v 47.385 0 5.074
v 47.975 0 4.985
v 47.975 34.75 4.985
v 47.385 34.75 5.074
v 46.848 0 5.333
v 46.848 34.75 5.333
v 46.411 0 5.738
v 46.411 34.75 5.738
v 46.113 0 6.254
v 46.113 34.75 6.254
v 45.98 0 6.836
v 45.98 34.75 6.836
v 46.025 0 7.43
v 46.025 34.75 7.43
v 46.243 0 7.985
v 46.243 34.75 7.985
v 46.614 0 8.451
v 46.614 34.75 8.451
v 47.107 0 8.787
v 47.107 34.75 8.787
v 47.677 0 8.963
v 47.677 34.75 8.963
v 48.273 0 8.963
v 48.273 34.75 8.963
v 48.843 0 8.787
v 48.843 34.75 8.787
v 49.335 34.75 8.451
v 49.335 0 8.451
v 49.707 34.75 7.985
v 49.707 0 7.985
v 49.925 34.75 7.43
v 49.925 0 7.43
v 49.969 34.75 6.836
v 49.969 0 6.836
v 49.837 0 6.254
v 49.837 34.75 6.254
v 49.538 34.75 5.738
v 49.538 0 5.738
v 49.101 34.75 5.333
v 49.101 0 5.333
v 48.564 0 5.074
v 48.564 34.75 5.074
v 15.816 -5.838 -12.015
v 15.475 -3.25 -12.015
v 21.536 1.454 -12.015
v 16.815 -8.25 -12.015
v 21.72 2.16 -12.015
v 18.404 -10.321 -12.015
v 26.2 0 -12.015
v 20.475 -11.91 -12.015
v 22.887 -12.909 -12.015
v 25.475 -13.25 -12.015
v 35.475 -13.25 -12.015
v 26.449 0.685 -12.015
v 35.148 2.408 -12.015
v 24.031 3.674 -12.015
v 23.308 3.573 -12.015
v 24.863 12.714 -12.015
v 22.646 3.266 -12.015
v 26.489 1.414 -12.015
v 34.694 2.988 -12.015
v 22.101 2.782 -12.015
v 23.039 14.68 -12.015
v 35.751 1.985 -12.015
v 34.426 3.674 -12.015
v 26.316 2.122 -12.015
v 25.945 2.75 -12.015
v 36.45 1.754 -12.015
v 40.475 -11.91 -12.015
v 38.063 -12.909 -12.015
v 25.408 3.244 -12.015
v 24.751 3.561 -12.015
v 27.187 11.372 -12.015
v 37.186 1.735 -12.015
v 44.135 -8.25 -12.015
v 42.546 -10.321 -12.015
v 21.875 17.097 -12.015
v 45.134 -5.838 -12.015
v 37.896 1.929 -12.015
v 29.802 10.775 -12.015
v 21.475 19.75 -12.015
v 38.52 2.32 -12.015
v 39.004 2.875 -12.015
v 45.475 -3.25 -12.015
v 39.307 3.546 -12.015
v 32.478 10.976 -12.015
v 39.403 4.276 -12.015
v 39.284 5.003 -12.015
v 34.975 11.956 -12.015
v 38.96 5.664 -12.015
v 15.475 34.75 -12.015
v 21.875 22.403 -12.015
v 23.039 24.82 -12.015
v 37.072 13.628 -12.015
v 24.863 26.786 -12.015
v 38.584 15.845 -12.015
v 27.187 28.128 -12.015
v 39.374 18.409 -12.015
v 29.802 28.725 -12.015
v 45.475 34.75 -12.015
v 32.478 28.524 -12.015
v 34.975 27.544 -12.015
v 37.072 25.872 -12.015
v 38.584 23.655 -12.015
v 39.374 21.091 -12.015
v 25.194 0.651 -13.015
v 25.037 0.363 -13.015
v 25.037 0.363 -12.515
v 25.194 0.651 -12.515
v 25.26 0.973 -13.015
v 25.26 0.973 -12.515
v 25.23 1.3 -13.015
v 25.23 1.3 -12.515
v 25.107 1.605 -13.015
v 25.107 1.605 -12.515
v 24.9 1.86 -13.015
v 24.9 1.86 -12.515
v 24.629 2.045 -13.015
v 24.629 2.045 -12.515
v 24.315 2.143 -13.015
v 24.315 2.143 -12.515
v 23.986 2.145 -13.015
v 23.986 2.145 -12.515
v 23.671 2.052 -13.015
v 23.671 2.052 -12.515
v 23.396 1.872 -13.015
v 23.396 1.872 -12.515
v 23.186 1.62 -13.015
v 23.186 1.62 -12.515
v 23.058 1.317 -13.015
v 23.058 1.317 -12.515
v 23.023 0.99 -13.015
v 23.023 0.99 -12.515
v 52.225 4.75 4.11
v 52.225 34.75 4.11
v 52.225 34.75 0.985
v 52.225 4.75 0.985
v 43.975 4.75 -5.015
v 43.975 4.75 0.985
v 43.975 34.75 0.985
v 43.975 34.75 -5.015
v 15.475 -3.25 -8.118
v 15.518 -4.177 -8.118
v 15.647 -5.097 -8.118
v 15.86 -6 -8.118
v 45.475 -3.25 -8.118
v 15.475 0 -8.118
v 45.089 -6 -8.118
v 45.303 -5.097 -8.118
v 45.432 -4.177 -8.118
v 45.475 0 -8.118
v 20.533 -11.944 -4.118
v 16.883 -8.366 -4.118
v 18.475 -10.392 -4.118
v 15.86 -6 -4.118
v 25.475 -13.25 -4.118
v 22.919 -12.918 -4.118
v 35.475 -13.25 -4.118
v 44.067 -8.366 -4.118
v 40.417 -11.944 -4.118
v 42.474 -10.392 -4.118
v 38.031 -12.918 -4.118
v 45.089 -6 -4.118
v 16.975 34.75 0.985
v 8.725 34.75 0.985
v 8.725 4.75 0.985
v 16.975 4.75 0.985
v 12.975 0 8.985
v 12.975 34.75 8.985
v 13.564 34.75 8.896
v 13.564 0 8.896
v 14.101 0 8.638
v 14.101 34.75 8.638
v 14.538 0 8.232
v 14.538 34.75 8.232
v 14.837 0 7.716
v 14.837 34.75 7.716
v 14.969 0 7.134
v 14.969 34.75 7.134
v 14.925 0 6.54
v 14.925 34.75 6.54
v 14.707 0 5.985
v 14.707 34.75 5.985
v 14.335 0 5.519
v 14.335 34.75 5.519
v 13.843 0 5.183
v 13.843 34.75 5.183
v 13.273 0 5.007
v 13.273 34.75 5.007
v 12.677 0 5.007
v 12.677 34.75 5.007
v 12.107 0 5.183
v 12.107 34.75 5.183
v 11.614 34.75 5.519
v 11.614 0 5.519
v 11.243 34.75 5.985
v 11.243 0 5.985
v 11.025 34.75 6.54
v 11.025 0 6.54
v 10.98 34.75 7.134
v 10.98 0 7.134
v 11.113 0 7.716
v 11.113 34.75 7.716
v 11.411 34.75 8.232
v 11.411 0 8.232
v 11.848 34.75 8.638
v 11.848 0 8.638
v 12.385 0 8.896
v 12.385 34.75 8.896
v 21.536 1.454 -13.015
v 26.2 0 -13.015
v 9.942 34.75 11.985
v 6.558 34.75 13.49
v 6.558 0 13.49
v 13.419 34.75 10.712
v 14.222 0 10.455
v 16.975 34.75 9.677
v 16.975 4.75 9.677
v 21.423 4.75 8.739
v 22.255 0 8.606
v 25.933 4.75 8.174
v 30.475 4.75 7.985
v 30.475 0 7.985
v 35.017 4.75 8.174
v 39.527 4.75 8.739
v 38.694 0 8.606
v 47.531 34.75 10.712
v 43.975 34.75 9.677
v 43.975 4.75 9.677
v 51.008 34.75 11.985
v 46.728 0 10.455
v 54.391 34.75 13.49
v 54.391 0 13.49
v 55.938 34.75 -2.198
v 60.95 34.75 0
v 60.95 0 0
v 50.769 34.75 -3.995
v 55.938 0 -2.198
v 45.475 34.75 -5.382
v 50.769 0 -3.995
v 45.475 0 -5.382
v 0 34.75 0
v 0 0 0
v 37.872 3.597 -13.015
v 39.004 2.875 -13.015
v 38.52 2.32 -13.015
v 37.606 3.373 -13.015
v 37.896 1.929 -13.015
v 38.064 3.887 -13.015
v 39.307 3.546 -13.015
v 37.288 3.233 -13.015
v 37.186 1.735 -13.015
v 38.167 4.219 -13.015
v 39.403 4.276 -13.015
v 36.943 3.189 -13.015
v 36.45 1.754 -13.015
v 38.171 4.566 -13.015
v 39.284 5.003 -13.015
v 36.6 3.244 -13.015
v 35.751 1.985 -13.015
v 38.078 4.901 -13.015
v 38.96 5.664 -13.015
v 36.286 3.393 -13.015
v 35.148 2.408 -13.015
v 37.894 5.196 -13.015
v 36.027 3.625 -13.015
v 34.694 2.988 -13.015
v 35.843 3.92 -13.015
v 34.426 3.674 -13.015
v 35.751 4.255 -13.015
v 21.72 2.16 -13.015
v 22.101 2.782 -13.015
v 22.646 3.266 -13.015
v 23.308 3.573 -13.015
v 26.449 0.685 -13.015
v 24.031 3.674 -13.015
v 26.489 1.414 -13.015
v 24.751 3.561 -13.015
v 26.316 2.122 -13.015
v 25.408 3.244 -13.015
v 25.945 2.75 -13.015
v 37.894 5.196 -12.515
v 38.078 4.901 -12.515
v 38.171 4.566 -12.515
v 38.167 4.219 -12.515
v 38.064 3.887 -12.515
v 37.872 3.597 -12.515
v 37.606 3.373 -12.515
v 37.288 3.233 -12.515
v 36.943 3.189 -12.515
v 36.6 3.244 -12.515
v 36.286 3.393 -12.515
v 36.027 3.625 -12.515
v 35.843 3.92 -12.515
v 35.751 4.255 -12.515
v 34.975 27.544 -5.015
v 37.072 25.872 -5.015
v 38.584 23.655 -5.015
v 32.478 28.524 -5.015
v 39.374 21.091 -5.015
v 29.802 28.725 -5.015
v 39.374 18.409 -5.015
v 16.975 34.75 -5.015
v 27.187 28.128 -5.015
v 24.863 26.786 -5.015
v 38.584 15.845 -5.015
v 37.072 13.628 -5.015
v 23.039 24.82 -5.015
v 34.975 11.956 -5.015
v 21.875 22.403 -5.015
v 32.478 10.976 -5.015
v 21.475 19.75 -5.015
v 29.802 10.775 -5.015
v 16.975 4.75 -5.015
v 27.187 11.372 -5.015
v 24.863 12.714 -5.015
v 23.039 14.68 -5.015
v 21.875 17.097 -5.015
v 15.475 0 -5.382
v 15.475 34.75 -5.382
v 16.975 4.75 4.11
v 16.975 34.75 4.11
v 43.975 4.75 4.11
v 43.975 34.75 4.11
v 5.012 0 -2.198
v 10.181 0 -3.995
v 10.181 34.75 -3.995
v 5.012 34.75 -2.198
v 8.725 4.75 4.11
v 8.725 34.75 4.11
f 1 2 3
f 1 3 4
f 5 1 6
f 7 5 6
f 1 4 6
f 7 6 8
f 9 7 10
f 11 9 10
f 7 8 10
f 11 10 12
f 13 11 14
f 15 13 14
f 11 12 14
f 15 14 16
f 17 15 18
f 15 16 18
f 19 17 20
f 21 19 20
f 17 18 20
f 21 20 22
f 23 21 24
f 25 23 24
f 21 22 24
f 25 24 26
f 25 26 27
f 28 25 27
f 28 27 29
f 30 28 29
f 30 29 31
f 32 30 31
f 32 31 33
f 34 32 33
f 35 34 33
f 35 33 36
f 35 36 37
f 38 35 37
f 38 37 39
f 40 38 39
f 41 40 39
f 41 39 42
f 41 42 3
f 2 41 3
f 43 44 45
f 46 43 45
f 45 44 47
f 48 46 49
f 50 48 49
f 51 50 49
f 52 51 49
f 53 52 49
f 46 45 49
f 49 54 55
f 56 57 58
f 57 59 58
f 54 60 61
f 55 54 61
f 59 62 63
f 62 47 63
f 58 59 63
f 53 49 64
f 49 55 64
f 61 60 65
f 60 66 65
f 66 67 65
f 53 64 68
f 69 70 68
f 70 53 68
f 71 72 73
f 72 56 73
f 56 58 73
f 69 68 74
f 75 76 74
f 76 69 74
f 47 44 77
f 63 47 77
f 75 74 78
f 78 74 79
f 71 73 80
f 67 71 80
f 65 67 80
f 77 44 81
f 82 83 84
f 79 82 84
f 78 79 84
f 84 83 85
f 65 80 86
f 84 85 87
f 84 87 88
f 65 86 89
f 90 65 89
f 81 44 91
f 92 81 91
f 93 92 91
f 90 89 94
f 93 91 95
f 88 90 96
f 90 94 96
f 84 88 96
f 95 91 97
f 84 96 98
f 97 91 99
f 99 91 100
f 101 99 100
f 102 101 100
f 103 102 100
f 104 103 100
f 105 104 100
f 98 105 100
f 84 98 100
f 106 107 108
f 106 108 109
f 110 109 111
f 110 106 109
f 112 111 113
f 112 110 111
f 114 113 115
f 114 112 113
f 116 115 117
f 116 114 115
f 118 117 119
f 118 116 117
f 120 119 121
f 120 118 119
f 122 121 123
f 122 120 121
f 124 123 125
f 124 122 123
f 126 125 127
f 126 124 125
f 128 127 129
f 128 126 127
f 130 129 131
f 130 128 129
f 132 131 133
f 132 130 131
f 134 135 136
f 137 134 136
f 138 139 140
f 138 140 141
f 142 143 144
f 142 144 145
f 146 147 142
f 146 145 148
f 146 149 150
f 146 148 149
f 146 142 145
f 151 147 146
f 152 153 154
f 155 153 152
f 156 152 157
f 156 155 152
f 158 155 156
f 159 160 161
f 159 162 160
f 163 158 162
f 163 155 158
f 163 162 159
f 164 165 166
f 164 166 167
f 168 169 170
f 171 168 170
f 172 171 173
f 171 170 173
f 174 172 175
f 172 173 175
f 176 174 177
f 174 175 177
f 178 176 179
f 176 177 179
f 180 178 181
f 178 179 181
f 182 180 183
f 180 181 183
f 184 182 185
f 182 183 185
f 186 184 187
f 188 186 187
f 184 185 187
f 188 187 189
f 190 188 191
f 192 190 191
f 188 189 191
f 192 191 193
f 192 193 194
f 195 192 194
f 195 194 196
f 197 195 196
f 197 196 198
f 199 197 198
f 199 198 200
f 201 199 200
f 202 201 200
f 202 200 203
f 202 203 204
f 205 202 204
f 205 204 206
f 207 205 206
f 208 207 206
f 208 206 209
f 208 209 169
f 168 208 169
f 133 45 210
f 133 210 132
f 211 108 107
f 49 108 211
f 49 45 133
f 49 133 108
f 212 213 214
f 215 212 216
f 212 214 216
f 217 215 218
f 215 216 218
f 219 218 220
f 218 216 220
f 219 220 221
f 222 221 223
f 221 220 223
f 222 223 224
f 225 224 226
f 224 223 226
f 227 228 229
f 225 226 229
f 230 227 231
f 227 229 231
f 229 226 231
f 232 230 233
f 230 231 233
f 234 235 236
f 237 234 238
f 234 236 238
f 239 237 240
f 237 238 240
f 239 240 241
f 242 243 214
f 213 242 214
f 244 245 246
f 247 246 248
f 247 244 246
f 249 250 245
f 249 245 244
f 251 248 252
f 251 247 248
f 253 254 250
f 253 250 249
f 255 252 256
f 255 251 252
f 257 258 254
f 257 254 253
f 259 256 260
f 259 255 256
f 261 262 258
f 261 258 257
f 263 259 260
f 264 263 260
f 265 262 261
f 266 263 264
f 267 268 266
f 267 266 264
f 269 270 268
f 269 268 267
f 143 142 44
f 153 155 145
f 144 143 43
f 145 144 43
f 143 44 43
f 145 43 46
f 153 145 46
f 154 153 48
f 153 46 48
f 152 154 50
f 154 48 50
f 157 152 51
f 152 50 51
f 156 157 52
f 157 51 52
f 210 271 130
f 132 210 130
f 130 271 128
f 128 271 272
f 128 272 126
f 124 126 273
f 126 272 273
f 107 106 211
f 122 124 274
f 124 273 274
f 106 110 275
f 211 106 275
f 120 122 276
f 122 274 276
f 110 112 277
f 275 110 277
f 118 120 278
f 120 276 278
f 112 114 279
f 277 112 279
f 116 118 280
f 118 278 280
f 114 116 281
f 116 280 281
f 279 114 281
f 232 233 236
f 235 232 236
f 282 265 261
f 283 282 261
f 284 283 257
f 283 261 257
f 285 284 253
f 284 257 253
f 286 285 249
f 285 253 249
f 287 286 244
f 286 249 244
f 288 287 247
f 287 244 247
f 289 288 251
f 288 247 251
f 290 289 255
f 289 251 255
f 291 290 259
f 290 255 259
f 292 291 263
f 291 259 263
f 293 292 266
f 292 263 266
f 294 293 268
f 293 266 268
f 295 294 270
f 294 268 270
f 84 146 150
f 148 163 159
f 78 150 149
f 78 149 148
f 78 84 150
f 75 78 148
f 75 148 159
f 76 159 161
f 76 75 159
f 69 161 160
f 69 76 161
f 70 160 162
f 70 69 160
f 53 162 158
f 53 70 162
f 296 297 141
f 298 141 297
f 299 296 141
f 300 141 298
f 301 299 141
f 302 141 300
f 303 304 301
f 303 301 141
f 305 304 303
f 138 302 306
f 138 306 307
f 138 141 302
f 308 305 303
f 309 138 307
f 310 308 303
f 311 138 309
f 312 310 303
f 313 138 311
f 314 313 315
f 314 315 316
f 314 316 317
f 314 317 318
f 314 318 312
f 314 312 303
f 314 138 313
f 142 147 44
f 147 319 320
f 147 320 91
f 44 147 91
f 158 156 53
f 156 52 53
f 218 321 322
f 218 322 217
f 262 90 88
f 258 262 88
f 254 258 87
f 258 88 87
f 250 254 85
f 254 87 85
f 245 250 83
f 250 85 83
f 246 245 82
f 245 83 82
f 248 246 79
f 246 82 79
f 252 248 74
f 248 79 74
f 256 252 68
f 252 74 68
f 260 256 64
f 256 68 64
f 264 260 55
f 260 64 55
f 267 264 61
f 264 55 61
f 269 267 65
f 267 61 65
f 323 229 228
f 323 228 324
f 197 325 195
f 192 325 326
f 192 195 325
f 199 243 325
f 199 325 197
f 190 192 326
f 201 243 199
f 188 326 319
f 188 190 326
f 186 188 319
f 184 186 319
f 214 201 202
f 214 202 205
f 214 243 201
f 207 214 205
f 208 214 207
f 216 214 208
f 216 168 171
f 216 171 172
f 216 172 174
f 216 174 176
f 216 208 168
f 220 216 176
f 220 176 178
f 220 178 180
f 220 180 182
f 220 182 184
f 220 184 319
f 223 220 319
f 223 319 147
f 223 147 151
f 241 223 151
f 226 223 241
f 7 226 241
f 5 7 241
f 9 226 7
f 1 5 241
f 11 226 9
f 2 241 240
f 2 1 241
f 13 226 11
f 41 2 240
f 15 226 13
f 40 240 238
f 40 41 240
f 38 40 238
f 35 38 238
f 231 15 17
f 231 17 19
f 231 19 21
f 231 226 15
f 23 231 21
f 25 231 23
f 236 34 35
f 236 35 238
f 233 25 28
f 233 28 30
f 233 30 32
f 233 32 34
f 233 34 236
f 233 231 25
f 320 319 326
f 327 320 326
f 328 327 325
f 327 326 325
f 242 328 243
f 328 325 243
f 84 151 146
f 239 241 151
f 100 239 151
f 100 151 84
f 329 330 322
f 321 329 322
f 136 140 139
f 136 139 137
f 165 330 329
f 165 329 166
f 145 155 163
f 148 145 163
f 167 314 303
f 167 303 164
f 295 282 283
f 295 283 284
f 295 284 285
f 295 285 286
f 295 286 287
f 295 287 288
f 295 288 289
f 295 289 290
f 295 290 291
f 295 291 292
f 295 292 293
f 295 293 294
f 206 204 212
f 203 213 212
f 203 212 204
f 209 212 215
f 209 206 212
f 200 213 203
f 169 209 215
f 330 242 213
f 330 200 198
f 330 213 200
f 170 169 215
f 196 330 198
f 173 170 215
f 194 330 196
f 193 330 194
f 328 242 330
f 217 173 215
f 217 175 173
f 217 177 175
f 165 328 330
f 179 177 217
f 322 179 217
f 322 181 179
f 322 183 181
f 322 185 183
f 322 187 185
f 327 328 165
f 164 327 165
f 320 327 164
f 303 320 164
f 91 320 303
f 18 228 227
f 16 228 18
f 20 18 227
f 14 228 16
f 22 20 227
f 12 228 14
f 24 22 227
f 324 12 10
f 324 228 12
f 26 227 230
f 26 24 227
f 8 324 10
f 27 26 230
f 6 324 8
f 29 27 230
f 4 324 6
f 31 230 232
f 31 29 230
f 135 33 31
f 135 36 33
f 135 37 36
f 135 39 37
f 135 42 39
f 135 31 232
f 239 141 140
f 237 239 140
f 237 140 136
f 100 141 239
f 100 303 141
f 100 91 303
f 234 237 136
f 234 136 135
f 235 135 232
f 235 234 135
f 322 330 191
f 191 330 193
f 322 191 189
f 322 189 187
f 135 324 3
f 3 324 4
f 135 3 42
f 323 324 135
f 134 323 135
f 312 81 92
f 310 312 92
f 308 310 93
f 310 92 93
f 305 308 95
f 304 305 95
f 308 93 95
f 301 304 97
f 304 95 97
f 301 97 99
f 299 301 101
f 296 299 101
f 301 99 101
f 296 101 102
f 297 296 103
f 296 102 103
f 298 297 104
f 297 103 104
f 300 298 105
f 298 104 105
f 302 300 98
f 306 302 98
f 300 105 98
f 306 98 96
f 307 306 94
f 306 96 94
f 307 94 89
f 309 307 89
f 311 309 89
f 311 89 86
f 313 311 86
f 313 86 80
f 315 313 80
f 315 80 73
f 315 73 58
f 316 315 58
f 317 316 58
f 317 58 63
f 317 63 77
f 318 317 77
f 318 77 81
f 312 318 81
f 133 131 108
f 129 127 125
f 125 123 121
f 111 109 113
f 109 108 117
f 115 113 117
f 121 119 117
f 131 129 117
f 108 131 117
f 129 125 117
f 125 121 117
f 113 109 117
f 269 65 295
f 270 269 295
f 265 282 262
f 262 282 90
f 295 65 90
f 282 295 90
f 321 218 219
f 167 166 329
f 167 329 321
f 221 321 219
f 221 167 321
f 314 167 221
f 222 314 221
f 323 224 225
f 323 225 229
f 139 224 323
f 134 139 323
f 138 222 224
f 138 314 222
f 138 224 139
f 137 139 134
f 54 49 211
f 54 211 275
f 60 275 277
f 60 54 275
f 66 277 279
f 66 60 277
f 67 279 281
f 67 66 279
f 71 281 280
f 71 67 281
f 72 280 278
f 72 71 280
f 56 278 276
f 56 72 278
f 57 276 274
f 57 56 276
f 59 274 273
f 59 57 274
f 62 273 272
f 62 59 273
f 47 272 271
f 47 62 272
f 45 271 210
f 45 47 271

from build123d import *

# Parameters (mm, degrees)
BOSS_EXTRUDE1_DEPTH = 34.75
SKETCH2_R           = 2
CUT_EXTRUDE1_DEPTH  = 72.445179815
SKETCH3_W           = 30
SKETCH3_H           = 7.896551268
BOSS_EXTRUDE2_DEPTH = 48
SKETCH4_W           = 30
SKETCH4_H           = 6
CUT_EXTRUDE2_DEPTH  = 4
FILLET1_R           = 10
SKETCH5_R           = 9
CUT_EXTRUDE3_DEPTH  = 75.652167363
BOSS_EXTRUDE3_DEPTH = 1
CUT_EXTRUDE4_DEPTH  = 0.5
CUT_EXTRUDE5_START  = -30
CUT_EXTRUDE5_DEPTH  = 30
SKETCH11_W          = 8.25
SKETCH11_H          = 3.125
CUT_EXTRUDE6_DEPTH  = 30


with BuildPart() as part:
    # Sketch1 → Boss-Extrude1 (new body)
    with BuildSketch(Plane(origin=(0, 0, 0), x_dir=(1, 0, 0), z_dir=(0, 1, 0))):
        with BuildLine():
            Line((0, 0), (6.55816832, -13.490382807))
            ThreePointArc((6.55816832, -13.490382807), (30.474828919, -7.985034321), (54.391489518, -13.490382807))
            Line((54.391489518, -13.490382807), (60.949657838, 0))
            ThreePointArc((60.949657838, 0), (30.474828919, 7.014965679), (0, 0))
        make_face()
    extrude(amount=BOSS_EXTRUDE1_DEPTH)

    # Sketch2 → Cut-Extrude1 (cut, through all)
    with BuildSketch(Plane(origin=(0, 34.75, 0), x_dir=(1, 0, 0), z_dir=(0, 1, 0))):
        with Locations(Location((12.974828919, -6.985034321, 0), (0, 0, 270))):
            Circle(SKETCH2_R)
        with Locations(Location((47.974828919, -6.985034321, 0), (0, 0, 90))):
            Circle(SKETCH2_R)
    extrude(amount=-CUT_EXTRUDE1_DEPTH, mode=Mode.SUBTRACT)

    # Sketch3 → Boss-Extrude2 (add)
    with BuildSketch(Plane(origin=(0, 34.75, 0), x_dir=(1, 0, 0), z_dir=(0, 1, 0))):
        with Locations((30.474828919, 8.066690045)):
            Rectangle(SKETCH3_W, SKETCH3_H)
    extrude(amount=-BOSS_EXTRUDE2_DEPTH)

    # Sketch4 → Cut-Extrude2 (cut)
    with BuildSketch(Plane.XY.offset(-4.118414411)):
        with Locations((30.474828919, -3)):
            Rectangle(SKETCH4_W, SKETCH4_H)
    extrude(amount=-CUT_EXTRUDE2_DEPTH, mode=Mode.SUBTRACT)

    # Fillet1
    fillet1_edges = [part.edges().sort_by_distance(p)[0] for p in [
        (15.474828919, -13.25, -8.066690045),
        (45.474828919, -13.25, -8.066690045),
    ]]
    fillet(fillet1_edges, radius=FILLET1_R)

    # Sketch5 → Cut-Extrude3 (cut, through all)
    with BuildSketch(Plane(origin=(0, 0, -12.014965679), x_dir=(-1, 0, 0), z_dir=(0, 0, -1))):
        with Locations((-30.474828919, 19.75)):
            Circle(SKETCH5_R)
    extrude(amount=-CUT_EXTRUDE3_DEPTH, mode=Mode.SUBTRACT)

    # Sketch7 → Boss-Extrude3 (add)
    with BuildSketch(Plane(origin=(0, 0, -12.014965679), x_dir=(-1, 0, 0), z_dir=(0, 0, -1))):
        with BuildLine():
            Line((-21.536068007, 1.453872129), (-26.199769352, 0))
            ThreePointArc((-26.199769352, 0), (-24.751375622, 3.560871216), (-21.536068007, 1.453872129))
        make_face()
        with BuildLine():
            Line((-34.426020337, 3.673663851), (-38.960174422, 5.664158065))
            ThreePointArc((-38.960174422, 5.664158065), (-37.895872331, 1.929105477), (-34.426020337, 3.673663851))
        make_face()
    extrude(amount=BOSS_EXTRUDE3_DEPTH)

    # Sketch8 → Cut-Extrude4 (cut)
    with BuildSketch(Plane(origin=(0, 0, -13.014965679), x_dir=(-1, 0, 0), z_dir=(0, 0, -1))):
        with BuildLine():
            Line((-23.022731531, 0.990416495), (-25.036897729, 0.362516061))
            ThreePointArc((-25.036897729, 0.362516061), (-24.475304572, 2.105499822), (-23.022731531, 0.990416495))
        make_face()
        with BuildLine():
            Line((-35.750767501, 4.255228023), (-37.89390211, 5.196064386))
            ThreePointArc((-37.89390211, 5.196064386), (-37.451768412, 3.29185708), (-35.750767501, 4.255228023))
        make_face()
    extrude(amount=-CUT_EXTRUDE4_DEPTH, mode=Mode.SUBTRACT)

    # Sketch9 → Cut-Extrude5 (cut)
    with BuildSketch(Plane(origin=(0, 34.75, 0), x_dir=(1, 0, 0), z_dir=(0, 1, 0)).offset(CUT_EXTRUDE5_START)):
        with BuildLine():
            Line((30.474828919, 5.014965679), (30.474828919, -7.985034321))
            ThreePointArc((30.474828919, -7.985034321), (37.27763759, -8.409679524), (43.974828919, -9.677022281))
            Line((43.974828919, -9.677022281), (43.974828919, 5.014965679))
            Line((43.974828919, 5.014965679), (30.474828919, 5.014965679))
        make_face()
        with BuildLine():
            ThreePointArc((16.974828919, -9.677022281), (23.672020248, -8.409679524), (30.474828919, -7.985034321))
            Line((30.474828919, -7.985034321), (30.474828919, 5.014965679))
            Line((30.474828919, 5.014965679), (16.974828919, 5.014965679))
            Line((16.974828919, 5.014965679), (16.974828919, -9.677022281))
        make_face()
    extrude(amount=CUT_EXTRUDE5_DEPTH, mode=Mode.SUBTRACT)

    # Sketch11 → Cut-Extrude6 (cut)
    with BuildSketch(Plane(origin=(0, 34.75, 0), x_dir=(1, 0, 0), z_dir=(0, 1, 0))):
        with Locations((12.849828919, -2.547534321)):
            Rectangle(SKETCH11_W, SKETCH11_H)
        with Locations((48.099828919, -2.547534321)):
            Rectangle(SKETCH11_W, SKETCH11_H)
    extrude(amount=-CUT_EXTRUDE6_DEPTH, mode=Mode.SUBTRACT)


solid = part.part
